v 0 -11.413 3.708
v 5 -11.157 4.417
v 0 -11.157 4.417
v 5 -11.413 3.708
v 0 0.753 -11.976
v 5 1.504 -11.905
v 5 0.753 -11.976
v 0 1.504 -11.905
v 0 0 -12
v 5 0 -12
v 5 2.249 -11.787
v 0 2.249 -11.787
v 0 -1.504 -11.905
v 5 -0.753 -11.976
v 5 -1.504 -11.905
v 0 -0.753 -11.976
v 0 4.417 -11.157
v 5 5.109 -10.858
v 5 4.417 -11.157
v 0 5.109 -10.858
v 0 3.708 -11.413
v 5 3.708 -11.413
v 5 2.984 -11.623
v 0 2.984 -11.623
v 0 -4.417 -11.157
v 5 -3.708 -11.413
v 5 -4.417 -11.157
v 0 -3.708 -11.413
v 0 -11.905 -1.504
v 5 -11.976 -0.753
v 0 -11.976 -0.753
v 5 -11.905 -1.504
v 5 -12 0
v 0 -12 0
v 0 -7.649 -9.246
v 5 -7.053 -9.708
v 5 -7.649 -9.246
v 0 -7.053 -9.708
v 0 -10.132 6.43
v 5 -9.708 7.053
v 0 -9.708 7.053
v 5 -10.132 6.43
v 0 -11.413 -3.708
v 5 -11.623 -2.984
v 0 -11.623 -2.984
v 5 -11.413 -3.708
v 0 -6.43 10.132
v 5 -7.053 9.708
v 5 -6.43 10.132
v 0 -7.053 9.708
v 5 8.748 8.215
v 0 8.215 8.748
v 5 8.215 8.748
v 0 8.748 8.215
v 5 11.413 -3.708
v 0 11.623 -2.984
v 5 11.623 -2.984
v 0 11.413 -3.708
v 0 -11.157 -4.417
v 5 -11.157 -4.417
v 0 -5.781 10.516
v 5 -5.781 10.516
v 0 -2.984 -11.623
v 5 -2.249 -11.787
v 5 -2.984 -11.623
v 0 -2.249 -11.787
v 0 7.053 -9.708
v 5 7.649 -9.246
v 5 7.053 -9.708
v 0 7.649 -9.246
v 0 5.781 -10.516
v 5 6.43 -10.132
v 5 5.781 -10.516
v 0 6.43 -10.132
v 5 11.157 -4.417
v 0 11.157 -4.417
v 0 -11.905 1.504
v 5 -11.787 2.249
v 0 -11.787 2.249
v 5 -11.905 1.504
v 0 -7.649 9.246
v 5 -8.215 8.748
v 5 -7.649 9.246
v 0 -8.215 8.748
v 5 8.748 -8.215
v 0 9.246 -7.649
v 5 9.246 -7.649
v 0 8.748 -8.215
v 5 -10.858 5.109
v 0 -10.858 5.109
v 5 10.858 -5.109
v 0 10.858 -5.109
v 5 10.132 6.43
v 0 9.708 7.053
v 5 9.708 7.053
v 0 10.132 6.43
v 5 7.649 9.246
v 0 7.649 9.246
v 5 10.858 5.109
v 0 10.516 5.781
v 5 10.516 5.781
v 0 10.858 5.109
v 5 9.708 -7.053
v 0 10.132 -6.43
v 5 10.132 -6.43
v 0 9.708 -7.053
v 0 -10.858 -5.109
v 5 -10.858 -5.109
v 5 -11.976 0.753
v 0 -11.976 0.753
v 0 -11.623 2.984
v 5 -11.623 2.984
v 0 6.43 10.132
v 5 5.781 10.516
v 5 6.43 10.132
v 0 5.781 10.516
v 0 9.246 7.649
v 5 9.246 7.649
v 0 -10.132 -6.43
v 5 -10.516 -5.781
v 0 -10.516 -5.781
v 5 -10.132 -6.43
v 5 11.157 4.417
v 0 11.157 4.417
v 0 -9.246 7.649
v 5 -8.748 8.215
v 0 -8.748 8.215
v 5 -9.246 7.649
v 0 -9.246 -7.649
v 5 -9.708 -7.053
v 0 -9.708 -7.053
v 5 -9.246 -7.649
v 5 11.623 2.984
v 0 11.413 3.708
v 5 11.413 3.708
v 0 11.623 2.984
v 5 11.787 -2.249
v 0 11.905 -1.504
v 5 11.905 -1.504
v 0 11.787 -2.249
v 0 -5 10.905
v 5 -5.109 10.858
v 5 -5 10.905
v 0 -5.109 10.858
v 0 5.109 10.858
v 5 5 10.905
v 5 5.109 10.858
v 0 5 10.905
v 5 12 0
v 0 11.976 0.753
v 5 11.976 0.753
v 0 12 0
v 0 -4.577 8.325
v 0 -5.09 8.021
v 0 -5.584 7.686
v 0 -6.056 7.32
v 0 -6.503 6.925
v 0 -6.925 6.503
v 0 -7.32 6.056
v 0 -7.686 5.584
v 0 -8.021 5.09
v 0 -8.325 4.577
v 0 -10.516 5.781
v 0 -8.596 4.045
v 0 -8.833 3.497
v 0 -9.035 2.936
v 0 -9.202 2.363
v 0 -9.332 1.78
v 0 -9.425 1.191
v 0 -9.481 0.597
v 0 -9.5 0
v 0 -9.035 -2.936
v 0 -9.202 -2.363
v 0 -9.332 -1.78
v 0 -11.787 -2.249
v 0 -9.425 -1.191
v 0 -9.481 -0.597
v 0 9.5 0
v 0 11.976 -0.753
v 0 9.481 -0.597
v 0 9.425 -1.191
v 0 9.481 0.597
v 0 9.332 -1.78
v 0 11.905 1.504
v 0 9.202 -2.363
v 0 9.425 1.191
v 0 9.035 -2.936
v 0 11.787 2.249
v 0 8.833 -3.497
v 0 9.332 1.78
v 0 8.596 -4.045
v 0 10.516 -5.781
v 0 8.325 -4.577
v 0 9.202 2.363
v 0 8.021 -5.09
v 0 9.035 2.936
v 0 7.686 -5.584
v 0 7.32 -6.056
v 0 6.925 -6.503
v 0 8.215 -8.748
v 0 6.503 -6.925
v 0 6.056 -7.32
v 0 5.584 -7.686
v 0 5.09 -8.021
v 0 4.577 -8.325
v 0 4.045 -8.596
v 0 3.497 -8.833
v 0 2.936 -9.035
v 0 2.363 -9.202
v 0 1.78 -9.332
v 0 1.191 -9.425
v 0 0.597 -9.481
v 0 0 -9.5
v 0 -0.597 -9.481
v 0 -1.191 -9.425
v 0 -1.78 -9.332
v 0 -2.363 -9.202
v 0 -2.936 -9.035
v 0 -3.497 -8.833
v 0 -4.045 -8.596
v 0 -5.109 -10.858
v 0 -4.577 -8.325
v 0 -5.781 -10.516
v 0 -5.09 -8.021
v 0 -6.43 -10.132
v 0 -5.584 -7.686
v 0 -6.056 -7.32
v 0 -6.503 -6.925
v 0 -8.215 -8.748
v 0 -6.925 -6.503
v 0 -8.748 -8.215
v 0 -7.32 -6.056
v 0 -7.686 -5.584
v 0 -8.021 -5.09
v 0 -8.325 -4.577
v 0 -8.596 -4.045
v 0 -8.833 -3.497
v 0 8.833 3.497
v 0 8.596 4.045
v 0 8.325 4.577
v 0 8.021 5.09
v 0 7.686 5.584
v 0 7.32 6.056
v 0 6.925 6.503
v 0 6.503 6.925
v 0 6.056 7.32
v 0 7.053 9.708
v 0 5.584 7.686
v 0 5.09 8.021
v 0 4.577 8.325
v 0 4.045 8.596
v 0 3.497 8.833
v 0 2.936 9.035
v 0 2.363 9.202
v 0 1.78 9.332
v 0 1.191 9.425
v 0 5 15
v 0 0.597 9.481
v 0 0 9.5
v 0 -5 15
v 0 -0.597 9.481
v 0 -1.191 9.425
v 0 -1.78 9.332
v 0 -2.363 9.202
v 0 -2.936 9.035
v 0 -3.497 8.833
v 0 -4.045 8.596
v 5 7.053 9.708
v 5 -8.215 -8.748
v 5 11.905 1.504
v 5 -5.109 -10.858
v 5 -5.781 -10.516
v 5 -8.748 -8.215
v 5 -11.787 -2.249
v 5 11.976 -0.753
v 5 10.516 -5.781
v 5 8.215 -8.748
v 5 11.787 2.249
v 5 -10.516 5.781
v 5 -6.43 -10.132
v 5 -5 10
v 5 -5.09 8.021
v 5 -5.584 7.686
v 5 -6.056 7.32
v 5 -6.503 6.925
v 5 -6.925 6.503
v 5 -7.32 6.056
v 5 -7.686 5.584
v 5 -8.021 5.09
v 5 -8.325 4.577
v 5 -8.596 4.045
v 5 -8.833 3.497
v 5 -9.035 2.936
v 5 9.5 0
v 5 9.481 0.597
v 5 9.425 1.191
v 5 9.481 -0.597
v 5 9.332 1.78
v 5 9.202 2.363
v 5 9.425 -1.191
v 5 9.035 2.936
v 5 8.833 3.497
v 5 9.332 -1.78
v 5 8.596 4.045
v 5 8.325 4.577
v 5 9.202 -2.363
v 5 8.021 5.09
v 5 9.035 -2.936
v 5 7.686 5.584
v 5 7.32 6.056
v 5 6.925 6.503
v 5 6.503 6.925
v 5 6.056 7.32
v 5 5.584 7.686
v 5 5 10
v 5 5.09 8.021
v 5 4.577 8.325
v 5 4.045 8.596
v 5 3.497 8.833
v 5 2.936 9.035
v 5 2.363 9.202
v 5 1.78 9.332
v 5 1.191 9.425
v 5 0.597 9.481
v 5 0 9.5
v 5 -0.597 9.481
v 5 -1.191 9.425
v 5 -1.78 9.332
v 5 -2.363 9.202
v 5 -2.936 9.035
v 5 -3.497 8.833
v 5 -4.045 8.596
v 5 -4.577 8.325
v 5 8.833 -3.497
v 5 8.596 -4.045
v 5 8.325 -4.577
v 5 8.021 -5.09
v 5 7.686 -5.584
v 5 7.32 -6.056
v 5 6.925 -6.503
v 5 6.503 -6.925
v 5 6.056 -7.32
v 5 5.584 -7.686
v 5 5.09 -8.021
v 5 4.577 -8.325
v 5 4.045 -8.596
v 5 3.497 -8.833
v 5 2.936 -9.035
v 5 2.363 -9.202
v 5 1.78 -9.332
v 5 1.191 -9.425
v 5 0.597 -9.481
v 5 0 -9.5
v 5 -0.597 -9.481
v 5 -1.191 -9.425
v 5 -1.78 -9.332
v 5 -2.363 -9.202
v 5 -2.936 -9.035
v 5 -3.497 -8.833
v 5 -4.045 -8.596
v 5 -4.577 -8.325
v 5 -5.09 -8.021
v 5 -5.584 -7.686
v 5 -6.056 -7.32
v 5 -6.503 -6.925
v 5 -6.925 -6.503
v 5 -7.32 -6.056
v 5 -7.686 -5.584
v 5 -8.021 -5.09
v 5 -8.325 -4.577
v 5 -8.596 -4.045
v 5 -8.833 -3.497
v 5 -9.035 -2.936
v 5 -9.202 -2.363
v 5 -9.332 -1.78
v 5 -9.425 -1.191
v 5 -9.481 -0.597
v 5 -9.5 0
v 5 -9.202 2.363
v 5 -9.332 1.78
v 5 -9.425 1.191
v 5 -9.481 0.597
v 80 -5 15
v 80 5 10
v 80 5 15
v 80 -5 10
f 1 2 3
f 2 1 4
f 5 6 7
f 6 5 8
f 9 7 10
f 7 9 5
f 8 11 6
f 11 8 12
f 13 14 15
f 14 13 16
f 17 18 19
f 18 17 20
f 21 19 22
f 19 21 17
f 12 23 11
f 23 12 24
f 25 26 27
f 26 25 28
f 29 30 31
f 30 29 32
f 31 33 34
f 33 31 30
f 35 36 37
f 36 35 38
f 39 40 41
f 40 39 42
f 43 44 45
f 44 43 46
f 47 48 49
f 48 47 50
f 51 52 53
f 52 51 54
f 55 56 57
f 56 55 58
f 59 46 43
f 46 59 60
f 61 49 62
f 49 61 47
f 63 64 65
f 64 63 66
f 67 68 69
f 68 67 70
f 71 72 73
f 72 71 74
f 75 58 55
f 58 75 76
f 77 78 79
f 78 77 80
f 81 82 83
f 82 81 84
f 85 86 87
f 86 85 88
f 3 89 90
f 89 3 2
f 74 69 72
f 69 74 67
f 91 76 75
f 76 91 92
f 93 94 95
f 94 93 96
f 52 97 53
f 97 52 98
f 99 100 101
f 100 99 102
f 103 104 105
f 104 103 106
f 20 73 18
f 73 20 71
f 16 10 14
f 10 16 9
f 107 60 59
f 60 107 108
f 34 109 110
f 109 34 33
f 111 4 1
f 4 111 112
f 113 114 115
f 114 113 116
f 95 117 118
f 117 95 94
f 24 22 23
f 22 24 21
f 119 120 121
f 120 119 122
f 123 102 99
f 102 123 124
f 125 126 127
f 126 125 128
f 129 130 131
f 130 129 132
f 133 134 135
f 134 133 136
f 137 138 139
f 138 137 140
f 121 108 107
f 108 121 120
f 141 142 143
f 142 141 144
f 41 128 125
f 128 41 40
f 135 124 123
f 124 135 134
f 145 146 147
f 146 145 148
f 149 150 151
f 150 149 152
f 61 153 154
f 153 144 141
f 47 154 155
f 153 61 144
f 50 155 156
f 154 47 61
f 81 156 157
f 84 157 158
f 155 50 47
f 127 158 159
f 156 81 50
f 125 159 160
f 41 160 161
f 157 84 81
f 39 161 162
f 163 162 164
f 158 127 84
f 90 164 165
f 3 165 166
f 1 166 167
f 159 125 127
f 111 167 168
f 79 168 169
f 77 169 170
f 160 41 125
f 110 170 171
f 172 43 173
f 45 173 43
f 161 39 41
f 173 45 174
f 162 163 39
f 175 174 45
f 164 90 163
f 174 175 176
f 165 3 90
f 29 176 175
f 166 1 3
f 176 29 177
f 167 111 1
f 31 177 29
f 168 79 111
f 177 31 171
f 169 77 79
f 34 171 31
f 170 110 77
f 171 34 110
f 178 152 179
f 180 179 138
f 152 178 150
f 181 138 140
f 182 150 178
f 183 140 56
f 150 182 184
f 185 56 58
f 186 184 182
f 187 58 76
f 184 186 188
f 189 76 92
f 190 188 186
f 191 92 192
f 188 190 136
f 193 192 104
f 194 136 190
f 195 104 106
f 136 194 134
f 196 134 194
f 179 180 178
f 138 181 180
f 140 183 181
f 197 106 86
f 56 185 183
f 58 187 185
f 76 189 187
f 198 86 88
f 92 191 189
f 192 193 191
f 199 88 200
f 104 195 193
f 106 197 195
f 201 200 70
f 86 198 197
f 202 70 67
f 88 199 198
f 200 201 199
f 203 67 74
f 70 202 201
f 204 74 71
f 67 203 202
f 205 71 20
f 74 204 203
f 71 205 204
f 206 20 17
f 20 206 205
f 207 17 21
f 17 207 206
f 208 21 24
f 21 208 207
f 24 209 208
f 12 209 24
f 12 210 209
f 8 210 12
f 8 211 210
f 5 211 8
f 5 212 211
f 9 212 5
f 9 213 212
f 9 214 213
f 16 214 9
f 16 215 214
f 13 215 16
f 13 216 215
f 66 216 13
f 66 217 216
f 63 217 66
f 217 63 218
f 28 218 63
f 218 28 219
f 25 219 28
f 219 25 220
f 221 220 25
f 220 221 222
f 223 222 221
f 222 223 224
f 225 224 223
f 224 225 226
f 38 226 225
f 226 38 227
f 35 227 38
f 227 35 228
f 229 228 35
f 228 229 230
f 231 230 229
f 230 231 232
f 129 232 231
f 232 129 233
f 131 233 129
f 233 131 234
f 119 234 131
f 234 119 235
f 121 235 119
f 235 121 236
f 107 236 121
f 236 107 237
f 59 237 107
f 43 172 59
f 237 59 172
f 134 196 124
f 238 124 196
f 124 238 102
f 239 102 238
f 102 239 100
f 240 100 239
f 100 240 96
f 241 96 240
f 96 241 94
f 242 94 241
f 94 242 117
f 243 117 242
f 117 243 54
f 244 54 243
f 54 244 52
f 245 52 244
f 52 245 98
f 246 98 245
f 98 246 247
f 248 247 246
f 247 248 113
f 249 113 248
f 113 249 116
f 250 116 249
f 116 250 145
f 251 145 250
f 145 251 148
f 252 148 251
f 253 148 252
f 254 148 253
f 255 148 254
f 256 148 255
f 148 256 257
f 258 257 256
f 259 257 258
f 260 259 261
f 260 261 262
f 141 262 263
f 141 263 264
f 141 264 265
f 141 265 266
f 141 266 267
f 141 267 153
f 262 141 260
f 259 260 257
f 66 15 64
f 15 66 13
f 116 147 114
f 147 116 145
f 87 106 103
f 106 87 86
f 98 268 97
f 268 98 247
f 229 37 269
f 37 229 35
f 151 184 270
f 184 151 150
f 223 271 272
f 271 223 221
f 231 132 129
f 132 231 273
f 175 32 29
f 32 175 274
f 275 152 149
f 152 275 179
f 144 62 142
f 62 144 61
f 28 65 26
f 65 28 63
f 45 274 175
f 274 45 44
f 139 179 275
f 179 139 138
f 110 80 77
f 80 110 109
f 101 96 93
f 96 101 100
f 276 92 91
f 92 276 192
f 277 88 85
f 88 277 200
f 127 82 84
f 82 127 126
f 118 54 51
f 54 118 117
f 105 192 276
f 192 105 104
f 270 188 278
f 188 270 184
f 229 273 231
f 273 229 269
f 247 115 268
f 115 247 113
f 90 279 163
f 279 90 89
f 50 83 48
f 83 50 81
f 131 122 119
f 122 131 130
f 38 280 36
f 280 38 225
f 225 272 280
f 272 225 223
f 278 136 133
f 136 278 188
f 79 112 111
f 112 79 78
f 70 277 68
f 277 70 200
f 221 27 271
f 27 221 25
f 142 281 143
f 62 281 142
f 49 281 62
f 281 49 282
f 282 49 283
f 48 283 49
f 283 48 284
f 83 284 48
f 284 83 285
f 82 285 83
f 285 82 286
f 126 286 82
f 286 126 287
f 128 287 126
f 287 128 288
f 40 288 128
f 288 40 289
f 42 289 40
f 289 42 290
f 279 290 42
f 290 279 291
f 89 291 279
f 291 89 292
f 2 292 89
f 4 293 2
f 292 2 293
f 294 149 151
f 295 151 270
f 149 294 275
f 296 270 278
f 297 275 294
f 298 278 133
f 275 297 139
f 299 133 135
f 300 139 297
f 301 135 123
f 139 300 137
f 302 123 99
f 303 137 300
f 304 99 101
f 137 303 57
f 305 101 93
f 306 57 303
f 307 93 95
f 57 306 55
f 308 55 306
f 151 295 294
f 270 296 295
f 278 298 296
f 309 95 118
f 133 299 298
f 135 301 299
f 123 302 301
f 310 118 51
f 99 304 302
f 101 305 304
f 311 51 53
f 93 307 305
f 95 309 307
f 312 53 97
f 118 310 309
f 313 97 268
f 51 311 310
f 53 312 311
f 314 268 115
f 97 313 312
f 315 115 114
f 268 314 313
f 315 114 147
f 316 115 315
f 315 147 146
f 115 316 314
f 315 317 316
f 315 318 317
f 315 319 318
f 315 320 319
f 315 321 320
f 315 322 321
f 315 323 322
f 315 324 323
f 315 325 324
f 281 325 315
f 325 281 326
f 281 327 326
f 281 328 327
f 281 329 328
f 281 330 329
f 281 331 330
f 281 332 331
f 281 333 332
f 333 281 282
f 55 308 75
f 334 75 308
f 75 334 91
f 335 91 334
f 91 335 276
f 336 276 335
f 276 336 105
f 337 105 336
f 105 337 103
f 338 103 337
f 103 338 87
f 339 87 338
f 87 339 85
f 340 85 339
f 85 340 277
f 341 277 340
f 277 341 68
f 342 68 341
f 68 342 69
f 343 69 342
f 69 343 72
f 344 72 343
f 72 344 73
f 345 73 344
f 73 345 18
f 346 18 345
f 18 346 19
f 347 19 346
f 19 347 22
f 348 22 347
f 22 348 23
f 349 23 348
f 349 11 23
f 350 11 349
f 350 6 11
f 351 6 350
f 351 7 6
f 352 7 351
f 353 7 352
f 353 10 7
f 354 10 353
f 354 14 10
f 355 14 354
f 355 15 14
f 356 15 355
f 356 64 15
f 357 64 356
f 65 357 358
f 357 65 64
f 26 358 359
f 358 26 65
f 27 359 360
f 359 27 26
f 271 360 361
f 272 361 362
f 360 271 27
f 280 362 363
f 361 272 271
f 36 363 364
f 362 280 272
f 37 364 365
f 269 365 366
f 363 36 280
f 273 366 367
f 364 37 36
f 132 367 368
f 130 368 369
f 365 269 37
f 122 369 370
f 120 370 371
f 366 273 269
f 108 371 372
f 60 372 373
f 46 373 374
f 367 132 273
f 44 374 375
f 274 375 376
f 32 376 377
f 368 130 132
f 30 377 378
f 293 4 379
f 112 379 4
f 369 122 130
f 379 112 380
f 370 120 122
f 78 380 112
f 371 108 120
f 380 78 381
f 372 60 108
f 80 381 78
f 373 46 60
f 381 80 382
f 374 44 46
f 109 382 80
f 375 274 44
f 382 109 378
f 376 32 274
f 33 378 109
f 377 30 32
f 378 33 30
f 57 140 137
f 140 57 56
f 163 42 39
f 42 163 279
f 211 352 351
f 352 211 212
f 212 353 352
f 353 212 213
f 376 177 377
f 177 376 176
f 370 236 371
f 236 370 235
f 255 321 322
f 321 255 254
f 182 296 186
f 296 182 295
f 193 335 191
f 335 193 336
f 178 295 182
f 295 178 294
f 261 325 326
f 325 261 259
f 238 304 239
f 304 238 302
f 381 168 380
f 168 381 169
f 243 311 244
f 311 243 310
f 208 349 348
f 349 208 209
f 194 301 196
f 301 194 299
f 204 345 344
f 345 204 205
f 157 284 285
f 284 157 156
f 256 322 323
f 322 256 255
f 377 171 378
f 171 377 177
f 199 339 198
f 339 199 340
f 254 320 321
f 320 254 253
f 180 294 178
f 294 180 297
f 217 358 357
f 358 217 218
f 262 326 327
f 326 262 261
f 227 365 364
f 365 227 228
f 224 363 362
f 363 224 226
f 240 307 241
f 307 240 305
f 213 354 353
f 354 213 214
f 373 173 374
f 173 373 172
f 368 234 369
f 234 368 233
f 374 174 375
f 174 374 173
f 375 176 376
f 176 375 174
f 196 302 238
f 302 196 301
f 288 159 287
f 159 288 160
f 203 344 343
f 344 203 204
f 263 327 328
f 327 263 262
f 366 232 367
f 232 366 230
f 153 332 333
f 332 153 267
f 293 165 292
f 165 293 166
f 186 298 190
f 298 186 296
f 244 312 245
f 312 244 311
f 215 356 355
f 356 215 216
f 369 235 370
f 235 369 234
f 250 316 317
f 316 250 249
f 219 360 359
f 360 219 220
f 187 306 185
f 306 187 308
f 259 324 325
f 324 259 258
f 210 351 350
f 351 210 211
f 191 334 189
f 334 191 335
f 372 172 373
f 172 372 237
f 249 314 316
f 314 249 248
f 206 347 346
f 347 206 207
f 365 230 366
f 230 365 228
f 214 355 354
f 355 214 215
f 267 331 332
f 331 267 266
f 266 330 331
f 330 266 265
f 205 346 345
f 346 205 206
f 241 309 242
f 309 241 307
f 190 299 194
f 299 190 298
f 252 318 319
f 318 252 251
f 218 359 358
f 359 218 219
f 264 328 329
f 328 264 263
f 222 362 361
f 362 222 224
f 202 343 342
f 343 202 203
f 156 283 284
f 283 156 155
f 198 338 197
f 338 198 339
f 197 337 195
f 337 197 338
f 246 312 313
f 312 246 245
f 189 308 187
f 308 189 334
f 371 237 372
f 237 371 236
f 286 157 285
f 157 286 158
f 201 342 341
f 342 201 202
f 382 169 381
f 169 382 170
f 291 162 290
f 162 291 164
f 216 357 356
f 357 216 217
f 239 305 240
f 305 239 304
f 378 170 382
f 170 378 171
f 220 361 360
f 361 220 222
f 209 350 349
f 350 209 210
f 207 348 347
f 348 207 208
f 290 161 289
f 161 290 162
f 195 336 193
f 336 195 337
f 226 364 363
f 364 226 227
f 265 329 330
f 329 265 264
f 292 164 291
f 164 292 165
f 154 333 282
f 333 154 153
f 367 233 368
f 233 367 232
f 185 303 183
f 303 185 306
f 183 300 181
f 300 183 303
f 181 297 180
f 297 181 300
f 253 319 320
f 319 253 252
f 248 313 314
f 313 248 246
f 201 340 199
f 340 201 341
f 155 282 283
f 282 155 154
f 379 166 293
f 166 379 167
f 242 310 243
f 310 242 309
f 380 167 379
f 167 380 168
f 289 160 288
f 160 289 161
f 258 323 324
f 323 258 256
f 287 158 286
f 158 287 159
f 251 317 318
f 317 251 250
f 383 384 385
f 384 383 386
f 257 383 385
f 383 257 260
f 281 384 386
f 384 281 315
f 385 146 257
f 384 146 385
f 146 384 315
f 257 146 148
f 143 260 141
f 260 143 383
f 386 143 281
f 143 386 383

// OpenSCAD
smooth = 100;

module ring() 
{
  difference() {
    cylinder(h = 5, d = 24, $fn = smooth);
    translate([0,0,-1]) cylinder(h = 7, d = 19, $fn = smooth);
  }
}

module strip_base()
{
  cube(size = [80,10,5]);
}

rotate([0,90,0]) ring();
translate([0,-5,10]) strip_base();
